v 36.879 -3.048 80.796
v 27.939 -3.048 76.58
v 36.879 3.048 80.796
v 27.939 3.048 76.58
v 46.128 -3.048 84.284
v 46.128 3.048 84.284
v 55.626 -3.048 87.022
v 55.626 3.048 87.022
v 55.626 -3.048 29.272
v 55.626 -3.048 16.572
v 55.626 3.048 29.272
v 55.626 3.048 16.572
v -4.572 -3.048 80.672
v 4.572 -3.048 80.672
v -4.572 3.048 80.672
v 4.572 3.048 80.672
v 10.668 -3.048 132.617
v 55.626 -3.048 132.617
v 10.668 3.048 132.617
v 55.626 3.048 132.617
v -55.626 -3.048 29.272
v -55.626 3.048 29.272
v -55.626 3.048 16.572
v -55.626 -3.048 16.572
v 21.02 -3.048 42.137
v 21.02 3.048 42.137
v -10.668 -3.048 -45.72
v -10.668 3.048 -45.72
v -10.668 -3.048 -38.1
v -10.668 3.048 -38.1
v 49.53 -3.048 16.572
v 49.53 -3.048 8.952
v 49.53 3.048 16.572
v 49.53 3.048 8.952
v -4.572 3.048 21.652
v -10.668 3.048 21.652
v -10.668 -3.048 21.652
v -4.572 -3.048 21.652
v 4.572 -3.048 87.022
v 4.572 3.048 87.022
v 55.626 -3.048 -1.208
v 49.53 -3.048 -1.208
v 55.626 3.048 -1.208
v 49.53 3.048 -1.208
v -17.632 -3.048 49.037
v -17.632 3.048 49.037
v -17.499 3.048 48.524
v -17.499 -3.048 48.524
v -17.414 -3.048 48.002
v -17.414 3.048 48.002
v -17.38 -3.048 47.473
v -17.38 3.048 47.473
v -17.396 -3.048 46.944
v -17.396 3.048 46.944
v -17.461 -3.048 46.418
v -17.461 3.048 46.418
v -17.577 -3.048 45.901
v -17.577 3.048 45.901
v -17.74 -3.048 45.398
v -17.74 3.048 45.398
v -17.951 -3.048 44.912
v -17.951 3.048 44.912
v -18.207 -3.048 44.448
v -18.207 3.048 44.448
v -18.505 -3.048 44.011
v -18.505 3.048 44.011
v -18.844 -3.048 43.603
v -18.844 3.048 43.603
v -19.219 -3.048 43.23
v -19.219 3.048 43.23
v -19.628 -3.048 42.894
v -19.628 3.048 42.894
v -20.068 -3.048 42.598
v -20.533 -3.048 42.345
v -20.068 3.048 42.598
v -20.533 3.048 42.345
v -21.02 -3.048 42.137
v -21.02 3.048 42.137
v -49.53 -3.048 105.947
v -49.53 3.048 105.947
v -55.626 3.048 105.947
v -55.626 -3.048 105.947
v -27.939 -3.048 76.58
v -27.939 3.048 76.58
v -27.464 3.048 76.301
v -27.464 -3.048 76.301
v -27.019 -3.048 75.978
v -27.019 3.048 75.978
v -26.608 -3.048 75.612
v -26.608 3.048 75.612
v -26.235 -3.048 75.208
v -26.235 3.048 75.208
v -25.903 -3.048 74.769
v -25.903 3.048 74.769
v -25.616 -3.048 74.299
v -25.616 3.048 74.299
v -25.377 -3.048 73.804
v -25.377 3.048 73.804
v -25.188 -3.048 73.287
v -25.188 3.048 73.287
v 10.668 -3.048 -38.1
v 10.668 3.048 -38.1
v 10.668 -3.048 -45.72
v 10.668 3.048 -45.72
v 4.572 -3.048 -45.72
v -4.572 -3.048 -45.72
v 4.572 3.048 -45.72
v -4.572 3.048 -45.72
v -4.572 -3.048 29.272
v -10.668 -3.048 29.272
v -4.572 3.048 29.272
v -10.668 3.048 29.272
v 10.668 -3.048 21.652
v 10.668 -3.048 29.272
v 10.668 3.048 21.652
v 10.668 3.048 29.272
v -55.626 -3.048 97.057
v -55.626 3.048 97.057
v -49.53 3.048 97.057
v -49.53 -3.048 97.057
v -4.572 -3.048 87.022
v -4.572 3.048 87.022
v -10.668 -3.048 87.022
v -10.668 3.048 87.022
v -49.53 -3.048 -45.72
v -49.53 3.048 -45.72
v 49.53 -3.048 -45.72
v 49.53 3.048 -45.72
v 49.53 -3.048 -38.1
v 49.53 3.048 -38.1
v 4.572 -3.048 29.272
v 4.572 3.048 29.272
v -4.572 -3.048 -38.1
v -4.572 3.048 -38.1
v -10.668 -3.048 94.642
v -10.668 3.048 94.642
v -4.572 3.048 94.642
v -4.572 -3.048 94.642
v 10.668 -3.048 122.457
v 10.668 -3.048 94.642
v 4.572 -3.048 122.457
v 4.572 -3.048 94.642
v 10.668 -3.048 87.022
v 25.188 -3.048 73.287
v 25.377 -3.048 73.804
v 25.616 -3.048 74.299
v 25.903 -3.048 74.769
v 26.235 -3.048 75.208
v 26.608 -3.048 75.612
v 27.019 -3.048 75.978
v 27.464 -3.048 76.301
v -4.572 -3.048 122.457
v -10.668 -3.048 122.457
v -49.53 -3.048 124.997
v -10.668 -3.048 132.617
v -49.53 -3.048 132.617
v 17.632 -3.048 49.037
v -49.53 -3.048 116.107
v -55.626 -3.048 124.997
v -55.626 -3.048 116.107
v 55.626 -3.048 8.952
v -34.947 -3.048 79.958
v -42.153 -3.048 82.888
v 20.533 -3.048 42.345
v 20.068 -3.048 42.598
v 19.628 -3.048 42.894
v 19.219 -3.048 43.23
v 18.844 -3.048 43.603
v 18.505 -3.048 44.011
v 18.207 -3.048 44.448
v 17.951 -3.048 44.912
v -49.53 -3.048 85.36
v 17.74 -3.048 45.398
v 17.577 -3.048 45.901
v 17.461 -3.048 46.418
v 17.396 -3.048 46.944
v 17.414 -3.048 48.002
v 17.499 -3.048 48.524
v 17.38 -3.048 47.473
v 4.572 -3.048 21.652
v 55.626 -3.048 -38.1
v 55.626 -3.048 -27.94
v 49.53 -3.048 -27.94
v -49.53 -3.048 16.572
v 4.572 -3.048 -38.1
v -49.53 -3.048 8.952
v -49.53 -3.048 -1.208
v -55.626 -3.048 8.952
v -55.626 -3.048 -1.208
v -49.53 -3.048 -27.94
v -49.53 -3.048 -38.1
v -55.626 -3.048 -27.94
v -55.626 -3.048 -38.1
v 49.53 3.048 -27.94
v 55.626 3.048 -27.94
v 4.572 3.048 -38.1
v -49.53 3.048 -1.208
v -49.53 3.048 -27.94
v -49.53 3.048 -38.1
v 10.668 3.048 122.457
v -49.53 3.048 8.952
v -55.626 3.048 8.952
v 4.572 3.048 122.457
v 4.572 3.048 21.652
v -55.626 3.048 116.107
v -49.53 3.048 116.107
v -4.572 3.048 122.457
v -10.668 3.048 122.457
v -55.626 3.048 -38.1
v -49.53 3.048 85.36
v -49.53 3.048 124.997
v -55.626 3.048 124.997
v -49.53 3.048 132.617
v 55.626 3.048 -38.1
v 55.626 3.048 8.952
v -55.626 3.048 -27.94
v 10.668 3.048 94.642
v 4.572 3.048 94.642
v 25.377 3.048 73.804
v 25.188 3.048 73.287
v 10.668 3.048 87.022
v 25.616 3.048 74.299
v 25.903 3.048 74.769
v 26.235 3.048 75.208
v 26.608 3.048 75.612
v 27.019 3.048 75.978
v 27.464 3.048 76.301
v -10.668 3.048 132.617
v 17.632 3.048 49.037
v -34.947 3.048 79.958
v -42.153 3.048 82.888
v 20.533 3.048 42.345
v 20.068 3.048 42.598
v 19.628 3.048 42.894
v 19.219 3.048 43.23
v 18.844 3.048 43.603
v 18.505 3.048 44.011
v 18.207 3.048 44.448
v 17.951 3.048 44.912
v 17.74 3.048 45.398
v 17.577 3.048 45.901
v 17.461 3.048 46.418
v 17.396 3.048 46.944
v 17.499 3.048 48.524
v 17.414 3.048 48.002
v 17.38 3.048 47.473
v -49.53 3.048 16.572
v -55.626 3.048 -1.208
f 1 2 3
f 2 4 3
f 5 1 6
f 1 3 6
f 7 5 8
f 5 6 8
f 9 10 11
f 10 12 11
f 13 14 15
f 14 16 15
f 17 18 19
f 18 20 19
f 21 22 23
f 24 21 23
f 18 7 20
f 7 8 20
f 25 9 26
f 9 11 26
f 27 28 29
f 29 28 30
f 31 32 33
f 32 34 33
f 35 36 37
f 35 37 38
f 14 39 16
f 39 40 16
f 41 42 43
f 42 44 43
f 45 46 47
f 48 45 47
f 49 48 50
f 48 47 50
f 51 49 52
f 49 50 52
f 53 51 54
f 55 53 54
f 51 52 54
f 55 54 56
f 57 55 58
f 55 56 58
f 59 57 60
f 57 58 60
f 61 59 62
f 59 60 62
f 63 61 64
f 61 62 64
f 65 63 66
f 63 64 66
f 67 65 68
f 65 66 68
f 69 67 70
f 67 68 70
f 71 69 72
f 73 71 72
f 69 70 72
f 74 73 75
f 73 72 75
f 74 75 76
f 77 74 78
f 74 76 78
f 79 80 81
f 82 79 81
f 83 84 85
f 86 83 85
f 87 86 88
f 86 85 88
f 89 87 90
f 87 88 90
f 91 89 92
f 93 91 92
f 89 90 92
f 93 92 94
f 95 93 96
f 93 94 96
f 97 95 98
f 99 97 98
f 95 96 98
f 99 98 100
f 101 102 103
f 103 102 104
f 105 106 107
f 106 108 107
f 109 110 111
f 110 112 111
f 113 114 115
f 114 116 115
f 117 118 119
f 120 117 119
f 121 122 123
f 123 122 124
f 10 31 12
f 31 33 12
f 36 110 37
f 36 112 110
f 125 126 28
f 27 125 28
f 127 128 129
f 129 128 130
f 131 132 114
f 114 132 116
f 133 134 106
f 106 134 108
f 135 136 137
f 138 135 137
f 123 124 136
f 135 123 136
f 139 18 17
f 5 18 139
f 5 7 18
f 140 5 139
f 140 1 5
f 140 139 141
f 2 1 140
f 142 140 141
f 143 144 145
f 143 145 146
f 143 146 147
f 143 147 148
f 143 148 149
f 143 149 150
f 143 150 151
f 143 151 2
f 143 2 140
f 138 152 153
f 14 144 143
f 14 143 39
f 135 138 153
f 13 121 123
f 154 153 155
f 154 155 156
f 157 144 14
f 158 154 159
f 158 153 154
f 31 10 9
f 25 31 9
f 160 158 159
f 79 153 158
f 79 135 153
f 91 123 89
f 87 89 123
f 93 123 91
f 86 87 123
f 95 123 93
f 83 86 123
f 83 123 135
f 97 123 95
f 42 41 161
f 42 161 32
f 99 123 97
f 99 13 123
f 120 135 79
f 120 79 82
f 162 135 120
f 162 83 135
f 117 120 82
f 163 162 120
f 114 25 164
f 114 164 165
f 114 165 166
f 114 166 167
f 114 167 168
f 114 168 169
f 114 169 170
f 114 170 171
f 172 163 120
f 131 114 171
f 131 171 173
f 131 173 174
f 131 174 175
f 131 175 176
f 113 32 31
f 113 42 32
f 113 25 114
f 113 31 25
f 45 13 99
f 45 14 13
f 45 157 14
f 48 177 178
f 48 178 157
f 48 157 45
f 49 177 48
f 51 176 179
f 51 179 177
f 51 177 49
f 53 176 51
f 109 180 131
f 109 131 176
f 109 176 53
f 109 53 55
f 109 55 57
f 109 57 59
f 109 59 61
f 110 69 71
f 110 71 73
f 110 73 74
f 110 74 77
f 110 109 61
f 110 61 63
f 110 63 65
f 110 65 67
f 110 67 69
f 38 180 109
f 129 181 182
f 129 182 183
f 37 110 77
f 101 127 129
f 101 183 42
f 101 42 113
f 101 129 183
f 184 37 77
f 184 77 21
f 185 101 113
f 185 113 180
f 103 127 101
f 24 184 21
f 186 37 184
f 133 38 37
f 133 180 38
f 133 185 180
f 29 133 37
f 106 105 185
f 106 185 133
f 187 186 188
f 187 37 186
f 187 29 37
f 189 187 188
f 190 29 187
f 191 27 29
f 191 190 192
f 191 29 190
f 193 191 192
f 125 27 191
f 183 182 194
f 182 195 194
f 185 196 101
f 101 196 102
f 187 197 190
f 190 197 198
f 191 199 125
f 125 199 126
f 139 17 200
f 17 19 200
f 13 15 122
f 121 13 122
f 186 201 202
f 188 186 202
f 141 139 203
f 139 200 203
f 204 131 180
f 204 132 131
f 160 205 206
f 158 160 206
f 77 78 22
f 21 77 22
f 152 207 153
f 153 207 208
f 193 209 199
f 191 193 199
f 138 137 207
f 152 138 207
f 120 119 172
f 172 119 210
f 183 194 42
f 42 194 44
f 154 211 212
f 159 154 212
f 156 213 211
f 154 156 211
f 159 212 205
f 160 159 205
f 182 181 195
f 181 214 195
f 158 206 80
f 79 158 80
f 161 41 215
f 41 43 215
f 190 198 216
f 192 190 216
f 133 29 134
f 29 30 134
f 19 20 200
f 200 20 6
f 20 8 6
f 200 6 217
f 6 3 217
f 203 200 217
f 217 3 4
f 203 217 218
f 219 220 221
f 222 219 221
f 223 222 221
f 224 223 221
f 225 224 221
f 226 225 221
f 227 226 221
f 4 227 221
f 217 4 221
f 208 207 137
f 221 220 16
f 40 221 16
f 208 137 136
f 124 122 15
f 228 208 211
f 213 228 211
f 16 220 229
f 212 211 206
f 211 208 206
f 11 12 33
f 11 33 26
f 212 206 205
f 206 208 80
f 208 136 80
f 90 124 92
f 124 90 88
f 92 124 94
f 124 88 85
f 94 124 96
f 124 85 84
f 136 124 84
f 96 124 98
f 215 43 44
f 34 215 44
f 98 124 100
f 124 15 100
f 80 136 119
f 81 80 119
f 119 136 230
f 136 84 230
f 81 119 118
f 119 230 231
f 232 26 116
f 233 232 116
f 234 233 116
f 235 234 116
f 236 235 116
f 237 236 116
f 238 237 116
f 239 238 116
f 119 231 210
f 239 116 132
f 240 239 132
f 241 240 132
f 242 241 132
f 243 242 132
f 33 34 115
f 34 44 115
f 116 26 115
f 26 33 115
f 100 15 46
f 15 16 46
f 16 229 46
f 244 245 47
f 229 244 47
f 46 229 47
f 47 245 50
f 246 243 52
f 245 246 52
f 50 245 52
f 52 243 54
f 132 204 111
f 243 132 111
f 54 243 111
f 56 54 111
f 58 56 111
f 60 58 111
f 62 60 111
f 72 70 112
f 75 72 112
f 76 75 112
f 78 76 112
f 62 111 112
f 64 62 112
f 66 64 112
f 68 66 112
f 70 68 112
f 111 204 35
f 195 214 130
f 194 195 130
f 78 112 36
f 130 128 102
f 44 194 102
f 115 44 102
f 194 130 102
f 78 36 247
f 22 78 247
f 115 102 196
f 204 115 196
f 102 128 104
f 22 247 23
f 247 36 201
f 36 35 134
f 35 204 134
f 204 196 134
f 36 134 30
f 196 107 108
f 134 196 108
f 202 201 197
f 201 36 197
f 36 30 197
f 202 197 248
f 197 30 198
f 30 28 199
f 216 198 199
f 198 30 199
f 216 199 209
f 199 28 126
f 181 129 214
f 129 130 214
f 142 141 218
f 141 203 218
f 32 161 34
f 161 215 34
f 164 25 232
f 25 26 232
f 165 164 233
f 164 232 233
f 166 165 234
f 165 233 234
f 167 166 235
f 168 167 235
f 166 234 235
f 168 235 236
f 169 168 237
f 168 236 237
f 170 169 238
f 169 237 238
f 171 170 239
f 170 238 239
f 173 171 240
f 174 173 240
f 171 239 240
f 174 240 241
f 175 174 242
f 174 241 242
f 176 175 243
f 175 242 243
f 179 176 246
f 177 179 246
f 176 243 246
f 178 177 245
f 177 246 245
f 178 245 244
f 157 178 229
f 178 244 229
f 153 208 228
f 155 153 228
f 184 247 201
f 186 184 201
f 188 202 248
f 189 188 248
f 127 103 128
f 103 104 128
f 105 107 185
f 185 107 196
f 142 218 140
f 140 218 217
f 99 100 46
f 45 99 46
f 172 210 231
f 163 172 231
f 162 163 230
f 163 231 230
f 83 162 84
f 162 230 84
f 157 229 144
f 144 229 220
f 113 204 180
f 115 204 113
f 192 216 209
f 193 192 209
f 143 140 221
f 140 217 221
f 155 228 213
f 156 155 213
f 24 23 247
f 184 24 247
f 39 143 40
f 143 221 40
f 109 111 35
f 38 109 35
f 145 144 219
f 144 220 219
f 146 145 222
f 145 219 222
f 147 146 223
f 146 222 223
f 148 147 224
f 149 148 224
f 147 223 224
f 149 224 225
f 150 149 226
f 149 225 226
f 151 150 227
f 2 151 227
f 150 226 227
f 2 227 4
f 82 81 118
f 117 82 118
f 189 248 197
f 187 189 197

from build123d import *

# Parameters (mm, degrees)
SKETCH1_W           = 6.096
SKETCH1_H           = 7.62
BOSS_EXTRUDE1_DEPTH = 3.048


with BuildPart() as part:
    # Sketch1 → Boss-Extrude1 (new, symmetric)
    with BuildSketch(Plane(origin=(0, 0, 0), x_dir=(1, 0, 0), z_dir=(0, 1, 0))):
        with BuildLine():
            Line((-49.53, 45.72), (-10.668, 45.72))
            Line((-10.668, 45.72), (-10.668, 38.1))
            Line((-10.668, 38.1), (-4.572, 38.1))
            Line((-4.572, 38.1), (-4.572, 45.72))
            Line((-4.572, 45.72), (4.572, 45.72))
            Line((4.572, 45.72), (4.572, 38.1))
            Line((4.572, 38.1), (10.668, 38.1))
            Line((10.668, 38.1), (10.668, 45.72))
            Line((10.668, 45.72), (49.53, 45.72))
            Line((49.53, 45.72), (49.53, 38.1))
            Line((49.53, 38.1), (55.626, 38.1))
            Line((55.626, 38.1), (55.626, 27.94))
            Line((55.626, 27.94), (49.53, 27.94))
            Line((49.53, 27.94), (49.53, 1.208143374))
            Line((49.53, 1.208143374), (55.626, 1.208143374))
            Line((55.626, 1.208143374), (55.626, -8.951856626))
            Line((55.626, -8.951856626), (49.53, -8.951856626))
            Line((49.53, -8.951856626), (49.53, -16.571856626))
            Line((49.53, -16.571856626), (55.626, -16.571856626))
            Line((55.626, -16.571856626), (55.626, -29.271856626))
            Line((55.626, -29.271856626), (21.019827136, -42.136821893))
            ThreePointArc((21.019827136, -42.136821893), (17.95098831, -44.911778638), (17.631953735, -49.036869377))
            Line((17.631953735, -49.036869377), (25.187729856, -73.287029113))
            ThreePointArc((25.187729856, -73.287029113), (26.234780075, -75.207903536), (27.939063878, -76.579577488))
            ThreePointArc((27.939063878, -76.579577488), (41.468907088, -82.632484358), (55.626, -87.022365809))
            Line((55.626, -87.022365809), (55.626, -132.617292876))
            Line((55.626, -132.617292876), (10.668, -132.617292876))
            Line((10.668, -132.617292876), (10.668, -122.457292876))
            Line((10.668, -122.457292876), (4.572, -122.457292876))
            Line((4.572, -122.457292876), (4.572, -94.642365809))
            Line((4.572, -94.642365809), (10.668, -94.642365809))
            Line((10.668, -94.642365809), (10.668, -87.022365809))
            Line((10.668, -87.022365809), (4.572, -87.022365809))
            Line((4.572, -87.022365809), (4.572, -80.672365809))
            Line((4.572, -80.672365809), (-4.572, -80.672365809))
            Line((-4.572, -80.672365809), (-4.572, -87.022365809))
            Line((-4.572, -87.022365809), (-10.668, -87.022365809))
            Line((-10.668, -87.022365809), (-10.668, -94.642365809))
            Line((-10.668, -94.642365809), (-4.572, -94.642365809))
            Line((-4.572, -94.642365809), (-4.572, -122.457292876))
            Line((-4.572, -122.457292876), (-10.668, -122.457292876))
            Line((-10.668, -122.457292876), (-10.668, -132.617292876))
            Line((-10.668, -132.617292876), (-49.53, -132.617292876))
            Line((-49.53, -132.617292876), (-49.53, -124.997292876))
            Line((-49.53, -124.997292876), (-55.626, -124.997292876))
            Line((-55.626, -124.997292876), (-55.626, -116.107292876))
            Line((-55.626, -116.107292876), (-49.53, -116.107292876))
            Line((-49.53, -116.107292876), (-49.53, -105.947292876))
            Line((-49.53, -105.947292876), (-55.626, -105.947292876))
            Line((-55.626, -105.947292876), (-55.626, -97.057292876))
            Line((-55.626, -97.057292876), (-49.53, -97.057292876))
            Line((-49.53, -97.057292876), (-49.53, -85.359826344))
            ThreePointArc((-49.53, -85.359826344), (-38.527111219, -81.479756652), (-27.939063878, -76.579577488))
            ThreePointArc((-27.939063878, -76.579577488), (-26.234780075, -75.207903536), (-25.187729856, -73.287029113))
            Line((-25.187729856, -73.287029113), (-17.631953735, -49.036869377))
            ThreePointArc((-17.631953735, -49.036869377), (-17.95098831, -44.911778638), (-21.019827136, -42.136821893))
            Line((-21.019827136, -42.136821893), (-55.626, -29.271856626))
            Line((-55.626, -29.271856626), (-55.626, -16.571856626))
            Line((-55.626, -16.571856626), (-49.53, -16.571856626))
            Line((-49.53, -16.571856626), (-49.53, -8.951856626))
            Line((-49.53, -8.951856626), (-55.626, -8.951856626))
            Line((-55.626, -8.951856626), (-55.626, 1.208143374))
            Line((-55.626, 1.208143374), (-49.53, 1.208143374))
            Line((-49.53, 1.208143374), (-49.53, 27.94))
            Line((-49.53, 27.94), (-55.626, 27.94))
            Line((-55.626, 27.94), (-55.626, 38.1))
            Line((-55.626, 38.1), (-49.53, 38.1))
            Line((-49.53, 38.1), (-49.53, 45.72))
        make_face()
        with Locations((7.62, -25.461856626)):
            Rectangle(SKETCH1_W, SKETCH1_H, mode=Mode.SUBTRACT)
        with Locations((-7.62, -25.461856626)):
            Rectangle(SKETCH1_W, SKETCH1_H, mode=Mode.SUBTRACT)
    extrude(amount=BOSS_EXTRUDE1_DEPTH, both=True)


solid = part.part
